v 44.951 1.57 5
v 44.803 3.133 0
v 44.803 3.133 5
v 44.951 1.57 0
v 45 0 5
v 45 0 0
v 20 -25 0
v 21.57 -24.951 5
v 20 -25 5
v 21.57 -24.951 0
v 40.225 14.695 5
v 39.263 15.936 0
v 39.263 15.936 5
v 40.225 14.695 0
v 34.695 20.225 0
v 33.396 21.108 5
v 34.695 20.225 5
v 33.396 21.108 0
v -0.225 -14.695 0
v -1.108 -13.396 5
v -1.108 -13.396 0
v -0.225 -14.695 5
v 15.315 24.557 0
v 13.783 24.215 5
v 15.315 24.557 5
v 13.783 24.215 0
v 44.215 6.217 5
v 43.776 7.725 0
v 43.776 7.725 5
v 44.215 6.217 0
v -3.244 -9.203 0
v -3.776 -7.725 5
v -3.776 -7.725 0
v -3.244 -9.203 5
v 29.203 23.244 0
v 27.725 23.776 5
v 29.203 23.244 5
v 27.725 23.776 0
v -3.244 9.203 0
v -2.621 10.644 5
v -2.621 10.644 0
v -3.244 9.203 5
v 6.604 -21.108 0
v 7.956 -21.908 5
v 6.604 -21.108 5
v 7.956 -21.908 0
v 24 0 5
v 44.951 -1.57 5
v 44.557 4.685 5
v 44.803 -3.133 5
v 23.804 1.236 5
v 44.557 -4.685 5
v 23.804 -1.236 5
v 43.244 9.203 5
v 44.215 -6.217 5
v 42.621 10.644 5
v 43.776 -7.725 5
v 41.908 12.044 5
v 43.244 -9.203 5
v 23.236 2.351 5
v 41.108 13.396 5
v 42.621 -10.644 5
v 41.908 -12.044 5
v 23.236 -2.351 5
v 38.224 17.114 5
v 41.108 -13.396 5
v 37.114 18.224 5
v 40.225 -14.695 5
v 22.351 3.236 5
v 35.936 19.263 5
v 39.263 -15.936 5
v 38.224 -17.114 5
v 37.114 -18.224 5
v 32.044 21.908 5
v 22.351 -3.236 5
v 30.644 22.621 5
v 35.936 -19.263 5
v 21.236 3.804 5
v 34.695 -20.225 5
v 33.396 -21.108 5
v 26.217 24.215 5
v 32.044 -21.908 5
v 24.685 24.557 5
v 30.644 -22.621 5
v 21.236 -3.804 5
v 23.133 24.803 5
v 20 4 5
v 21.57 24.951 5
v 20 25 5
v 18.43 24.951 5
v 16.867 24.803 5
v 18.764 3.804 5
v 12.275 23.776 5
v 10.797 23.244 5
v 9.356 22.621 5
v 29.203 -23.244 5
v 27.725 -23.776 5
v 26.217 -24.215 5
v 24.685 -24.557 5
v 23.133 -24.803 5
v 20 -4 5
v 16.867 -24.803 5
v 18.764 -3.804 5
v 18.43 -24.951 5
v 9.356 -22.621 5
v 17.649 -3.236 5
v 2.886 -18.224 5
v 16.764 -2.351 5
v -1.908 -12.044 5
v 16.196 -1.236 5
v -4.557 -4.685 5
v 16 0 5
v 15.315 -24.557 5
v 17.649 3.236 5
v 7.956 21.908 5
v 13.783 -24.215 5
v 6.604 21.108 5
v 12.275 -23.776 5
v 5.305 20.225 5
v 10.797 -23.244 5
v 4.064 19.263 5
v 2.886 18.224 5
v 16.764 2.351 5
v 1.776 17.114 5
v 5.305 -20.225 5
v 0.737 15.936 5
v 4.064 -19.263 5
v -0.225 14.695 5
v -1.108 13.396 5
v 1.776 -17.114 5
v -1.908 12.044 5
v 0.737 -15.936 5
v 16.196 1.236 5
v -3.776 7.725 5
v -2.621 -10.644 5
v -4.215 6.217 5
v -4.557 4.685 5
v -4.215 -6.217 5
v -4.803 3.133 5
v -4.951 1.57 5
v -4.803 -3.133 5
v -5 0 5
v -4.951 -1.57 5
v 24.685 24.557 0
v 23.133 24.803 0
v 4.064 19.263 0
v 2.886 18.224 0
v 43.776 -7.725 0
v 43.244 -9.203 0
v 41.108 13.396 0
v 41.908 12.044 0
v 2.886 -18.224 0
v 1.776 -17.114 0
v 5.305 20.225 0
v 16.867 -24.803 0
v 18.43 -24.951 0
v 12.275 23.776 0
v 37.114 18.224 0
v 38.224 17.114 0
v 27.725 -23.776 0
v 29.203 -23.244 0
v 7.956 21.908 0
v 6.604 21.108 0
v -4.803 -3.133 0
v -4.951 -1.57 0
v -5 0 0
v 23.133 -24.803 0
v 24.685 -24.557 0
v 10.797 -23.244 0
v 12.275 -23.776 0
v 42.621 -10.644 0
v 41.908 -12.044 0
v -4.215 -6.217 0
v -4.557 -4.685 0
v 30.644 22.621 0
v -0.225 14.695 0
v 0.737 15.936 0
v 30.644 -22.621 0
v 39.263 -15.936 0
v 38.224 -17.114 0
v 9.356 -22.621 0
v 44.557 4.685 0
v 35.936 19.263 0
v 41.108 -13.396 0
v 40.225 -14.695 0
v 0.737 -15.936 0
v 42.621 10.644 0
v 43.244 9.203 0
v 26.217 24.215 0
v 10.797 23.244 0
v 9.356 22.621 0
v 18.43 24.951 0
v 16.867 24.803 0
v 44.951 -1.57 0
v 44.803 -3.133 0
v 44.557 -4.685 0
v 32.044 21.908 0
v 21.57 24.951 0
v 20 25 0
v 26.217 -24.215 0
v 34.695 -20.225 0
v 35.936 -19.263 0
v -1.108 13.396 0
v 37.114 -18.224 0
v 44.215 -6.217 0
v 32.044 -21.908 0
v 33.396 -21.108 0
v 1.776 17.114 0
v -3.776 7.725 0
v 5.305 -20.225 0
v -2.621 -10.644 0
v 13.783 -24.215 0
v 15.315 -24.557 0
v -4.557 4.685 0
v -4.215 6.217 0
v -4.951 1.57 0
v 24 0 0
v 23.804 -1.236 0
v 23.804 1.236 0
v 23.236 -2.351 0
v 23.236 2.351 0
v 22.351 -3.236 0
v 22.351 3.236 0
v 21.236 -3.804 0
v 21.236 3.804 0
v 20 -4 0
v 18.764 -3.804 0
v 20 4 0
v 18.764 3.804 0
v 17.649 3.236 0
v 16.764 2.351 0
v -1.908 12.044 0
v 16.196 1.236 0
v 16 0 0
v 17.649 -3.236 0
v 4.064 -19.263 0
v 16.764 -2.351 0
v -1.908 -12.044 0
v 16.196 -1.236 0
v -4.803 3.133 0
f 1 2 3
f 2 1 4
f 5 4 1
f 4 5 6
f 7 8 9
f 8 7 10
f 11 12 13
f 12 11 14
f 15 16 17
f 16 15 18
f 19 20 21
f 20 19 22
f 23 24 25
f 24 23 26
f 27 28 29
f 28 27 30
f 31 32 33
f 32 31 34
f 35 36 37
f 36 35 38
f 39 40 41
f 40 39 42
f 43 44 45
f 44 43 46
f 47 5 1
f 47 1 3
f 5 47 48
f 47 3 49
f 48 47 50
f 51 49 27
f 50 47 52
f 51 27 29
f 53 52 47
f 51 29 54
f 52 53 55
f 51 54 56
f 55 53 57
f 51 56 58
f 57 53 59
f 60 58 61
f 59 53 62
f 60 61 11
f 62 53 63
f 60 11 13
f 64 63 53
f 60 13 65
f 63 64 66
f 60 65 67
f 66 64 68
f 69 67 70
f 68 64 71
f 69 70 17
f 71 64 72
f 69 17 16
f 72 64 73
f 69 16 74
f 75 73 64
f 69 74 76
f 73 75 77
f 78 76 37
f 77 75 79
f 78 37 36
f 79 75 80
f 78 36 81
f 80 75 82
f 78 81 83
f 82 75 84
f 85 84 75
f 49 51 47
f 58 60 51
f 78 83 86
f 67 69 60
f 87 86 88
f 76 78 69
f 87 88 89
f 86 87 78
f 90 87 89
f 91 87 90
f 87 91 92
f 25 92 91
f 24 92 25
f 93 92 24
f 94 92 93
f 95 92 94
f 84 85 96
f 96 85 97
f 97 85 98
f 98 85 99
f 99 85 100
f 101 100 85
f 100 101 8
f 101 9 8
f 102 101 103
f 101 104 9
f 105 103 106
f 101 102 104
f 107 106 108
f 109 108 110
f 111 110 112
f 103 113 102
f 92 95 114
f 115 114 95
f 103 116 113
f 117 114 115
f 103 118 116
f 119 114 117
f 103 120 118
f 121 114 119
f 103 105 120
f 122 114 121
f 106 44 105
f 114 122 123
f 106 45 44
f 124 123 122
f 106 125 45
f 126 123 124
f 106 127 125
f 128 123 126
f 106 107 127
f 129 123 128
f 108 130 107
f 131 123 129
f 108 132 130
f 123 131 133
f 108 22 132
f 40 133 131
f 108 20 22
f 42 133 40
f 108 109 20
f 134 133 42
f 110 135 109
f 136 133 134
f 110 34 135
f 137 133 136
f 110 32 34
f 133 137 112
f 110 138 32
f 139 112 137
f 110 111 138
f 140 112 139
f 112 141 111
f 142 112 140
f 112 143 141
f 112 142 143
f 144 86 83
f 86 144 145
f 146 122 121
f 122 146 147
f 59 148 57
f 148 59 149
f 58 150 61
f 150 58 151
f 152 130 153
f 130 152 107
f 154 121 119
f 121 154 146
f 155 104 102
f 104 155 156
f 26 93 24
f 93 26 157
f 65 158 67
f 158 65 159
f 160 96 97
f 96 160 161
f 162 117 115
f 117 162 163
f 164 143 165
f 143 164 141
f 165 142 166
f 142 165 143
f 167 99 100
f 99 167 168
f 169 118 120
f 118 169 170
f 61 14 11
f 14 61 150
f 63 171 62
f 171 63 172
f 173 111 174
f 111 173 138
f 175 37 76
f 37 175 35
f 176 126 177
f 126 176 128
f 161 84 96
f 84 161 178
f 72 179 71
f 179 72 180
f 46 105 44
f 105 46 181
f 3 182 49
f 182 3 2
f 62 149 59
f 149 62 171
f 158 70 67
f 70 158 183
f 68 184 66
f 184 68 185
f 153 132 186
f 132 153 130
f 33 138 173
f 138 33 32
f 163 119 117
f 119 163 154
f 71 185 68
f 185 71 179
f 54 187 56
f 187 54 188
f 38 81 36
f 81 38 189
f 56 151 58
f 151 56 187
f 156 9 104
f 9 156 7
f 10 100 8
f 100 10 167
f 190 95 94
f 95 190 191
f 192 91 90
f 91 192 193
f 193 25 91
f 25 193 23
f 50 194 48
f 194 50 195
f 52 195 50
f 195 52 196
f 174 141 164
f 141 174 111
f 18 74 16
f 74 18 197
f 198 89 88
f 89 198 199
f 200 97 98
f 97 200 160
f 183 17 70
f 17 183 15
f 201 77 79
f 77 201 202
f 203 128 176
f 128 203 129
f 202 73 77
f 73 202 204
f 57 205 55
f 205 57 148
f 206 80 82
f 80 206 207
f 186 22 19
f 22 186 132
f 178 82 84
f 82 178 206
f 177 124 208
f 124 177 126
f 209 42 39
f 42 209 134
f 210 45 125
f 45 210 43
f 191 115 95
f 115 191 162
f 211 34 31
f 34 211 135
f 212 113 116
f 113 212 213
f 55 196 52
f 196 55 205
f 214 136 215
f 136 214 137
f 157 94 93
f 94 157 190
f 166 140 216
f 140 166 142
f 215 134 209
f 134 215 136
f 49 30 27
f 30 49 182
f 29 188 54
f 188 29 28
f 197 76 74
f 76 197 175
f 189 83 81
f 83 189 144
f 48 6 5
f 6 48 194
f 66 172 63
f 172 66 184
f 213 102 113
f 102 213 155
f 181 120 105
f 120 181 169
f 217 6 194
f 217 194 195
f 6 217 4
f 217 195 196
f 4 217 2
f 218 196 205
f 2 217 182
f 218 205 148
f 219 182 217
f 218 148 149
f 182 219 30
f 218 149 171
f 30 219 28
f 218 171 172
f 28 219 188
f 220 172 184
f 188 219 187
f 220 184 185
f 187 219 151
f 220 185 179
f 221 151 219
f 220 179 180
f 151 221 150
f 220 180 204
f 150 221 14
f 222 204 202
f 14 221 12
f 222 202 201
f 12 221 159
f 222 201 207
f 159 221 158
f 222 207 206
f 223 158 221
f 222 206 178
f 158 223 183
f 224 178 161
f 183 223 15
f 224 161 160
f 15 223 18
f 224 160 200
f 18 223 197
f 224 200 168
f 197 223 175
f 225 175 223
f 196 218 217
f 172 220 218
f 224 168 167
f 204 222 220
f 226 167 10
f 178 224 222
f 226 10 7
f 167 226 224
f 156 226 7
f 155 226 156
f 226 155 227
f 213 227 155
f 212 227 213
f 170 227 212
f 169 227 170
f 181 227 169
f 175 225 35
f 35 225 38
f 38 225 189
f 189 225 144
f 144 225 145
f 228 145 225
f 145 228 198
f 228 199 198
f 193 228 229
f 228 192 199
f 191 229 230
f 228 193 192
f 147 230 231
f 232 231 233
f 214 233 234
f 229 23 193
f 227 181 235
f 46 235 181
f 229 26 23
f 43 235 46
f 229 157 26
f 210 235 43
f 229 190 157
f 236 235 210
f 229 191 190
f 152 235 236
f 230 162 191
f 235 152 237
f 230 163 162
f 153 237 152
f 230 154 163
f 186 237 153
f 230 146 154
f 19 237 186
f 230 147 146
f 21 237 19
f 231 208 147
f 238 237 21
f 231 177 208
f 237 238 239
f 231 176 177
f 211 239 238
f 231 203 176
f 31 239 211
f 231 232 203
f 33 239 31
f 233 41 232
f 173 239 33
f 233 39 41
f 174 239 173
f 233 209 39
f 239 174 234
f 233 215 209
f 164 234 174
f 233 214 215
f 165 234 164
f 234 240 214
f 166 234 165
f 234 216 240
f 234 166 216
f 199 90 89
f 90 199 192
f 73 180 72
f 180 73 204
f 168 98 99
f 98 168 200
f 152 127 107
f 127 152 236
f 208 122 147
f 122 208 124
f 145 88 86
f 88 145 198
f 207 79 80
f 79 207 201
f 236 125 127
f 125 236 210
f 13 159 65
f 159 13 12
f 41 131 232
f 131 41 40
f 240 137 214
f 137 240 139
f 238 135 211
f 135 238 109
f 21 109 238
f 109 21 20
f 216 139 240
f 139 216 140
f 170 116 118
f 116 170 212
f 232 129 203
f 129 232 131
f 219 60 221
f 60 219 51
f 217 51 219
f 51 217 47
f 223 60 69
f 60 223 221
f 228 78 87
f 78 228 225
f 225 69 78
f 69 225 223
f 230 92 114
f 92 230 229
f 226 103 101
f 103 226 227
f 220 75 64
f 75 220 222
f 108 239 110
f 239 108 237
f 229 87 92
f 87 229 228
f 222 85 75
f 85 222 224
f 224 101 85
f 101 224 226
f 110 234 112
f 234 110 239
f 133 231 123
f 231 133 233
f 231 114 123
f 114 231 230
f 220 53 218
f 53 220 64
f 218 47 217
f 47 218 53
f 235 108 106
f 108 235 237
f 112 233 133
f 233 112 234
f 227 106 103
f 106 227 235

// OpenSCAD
//-- Rueda simple
translate([20,0,0])
difference(){
    //-- Base de la rueda
    cylinder(r=50/2, h=5, $fn=100);
    
    //--Taladro de 8mm
    cylinder(r=8/2, h=20, $fn=20, center=true);
}
